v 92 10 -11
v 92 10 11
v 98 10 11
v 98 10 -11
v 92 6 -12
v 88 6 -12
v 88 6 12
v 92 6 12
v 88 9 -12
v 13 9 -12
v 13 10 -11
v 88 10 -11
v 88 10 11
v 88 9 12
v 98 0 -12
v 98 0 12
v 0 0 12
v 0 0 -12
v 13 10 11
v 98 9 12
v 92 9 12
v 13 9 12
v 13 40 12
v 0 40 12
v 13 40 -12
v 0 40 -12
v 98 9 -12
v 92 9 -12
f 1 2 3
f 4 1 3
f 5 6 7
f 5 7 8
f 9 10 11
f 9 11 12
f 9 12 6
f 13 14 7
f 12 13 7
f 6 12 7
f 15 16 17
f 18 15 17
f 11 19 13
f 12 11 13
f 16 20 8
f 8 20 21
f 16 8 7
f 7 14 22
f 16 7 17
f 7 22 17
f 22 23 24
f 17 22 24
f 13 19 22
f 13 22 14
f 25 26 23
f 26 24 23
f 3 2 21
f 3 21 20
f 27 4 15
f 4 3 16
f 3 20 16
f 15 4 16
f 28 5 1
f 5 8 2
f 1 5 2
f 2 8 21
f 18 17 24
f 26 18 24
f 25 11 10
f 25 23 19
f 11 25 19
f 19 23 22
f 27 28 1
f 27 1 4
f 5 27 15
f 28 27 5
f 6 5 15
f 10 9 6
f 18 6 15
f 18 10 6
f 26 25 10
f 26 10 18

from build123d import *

# Parameters (mm, degrees)
BOSS_EXTRUDE1_DEPTH = 12
CHAMFER1_SIZE       = 1


with BuildPart() as part:
    # Sketch1 → Boss-Extrude1 (new, symmetric)
    with BuildSketch(Plane.XY):
        Polygon((0, 0), (0, 40), (13, 40), (13, 10), (88, 10), (88, 6), (92, 6), (92, 10), (98, 10), (98, 0), align=None)
    extrude(amount=BOSS_EXTRUDE1_DEPTH, both=True)

    # Chamfer1
    chamfer1_edges = [part.edges().sort_by_distance(p)[0] for p in [
        (50.5, 10, -12),
        (95, 10, 12),
        (95, 10, -12),
        (50.5, 10, 12),
    ]]
    chamfer(chamfer1_edges, length=CHAMFER1_SIZE)


solid = part.part
